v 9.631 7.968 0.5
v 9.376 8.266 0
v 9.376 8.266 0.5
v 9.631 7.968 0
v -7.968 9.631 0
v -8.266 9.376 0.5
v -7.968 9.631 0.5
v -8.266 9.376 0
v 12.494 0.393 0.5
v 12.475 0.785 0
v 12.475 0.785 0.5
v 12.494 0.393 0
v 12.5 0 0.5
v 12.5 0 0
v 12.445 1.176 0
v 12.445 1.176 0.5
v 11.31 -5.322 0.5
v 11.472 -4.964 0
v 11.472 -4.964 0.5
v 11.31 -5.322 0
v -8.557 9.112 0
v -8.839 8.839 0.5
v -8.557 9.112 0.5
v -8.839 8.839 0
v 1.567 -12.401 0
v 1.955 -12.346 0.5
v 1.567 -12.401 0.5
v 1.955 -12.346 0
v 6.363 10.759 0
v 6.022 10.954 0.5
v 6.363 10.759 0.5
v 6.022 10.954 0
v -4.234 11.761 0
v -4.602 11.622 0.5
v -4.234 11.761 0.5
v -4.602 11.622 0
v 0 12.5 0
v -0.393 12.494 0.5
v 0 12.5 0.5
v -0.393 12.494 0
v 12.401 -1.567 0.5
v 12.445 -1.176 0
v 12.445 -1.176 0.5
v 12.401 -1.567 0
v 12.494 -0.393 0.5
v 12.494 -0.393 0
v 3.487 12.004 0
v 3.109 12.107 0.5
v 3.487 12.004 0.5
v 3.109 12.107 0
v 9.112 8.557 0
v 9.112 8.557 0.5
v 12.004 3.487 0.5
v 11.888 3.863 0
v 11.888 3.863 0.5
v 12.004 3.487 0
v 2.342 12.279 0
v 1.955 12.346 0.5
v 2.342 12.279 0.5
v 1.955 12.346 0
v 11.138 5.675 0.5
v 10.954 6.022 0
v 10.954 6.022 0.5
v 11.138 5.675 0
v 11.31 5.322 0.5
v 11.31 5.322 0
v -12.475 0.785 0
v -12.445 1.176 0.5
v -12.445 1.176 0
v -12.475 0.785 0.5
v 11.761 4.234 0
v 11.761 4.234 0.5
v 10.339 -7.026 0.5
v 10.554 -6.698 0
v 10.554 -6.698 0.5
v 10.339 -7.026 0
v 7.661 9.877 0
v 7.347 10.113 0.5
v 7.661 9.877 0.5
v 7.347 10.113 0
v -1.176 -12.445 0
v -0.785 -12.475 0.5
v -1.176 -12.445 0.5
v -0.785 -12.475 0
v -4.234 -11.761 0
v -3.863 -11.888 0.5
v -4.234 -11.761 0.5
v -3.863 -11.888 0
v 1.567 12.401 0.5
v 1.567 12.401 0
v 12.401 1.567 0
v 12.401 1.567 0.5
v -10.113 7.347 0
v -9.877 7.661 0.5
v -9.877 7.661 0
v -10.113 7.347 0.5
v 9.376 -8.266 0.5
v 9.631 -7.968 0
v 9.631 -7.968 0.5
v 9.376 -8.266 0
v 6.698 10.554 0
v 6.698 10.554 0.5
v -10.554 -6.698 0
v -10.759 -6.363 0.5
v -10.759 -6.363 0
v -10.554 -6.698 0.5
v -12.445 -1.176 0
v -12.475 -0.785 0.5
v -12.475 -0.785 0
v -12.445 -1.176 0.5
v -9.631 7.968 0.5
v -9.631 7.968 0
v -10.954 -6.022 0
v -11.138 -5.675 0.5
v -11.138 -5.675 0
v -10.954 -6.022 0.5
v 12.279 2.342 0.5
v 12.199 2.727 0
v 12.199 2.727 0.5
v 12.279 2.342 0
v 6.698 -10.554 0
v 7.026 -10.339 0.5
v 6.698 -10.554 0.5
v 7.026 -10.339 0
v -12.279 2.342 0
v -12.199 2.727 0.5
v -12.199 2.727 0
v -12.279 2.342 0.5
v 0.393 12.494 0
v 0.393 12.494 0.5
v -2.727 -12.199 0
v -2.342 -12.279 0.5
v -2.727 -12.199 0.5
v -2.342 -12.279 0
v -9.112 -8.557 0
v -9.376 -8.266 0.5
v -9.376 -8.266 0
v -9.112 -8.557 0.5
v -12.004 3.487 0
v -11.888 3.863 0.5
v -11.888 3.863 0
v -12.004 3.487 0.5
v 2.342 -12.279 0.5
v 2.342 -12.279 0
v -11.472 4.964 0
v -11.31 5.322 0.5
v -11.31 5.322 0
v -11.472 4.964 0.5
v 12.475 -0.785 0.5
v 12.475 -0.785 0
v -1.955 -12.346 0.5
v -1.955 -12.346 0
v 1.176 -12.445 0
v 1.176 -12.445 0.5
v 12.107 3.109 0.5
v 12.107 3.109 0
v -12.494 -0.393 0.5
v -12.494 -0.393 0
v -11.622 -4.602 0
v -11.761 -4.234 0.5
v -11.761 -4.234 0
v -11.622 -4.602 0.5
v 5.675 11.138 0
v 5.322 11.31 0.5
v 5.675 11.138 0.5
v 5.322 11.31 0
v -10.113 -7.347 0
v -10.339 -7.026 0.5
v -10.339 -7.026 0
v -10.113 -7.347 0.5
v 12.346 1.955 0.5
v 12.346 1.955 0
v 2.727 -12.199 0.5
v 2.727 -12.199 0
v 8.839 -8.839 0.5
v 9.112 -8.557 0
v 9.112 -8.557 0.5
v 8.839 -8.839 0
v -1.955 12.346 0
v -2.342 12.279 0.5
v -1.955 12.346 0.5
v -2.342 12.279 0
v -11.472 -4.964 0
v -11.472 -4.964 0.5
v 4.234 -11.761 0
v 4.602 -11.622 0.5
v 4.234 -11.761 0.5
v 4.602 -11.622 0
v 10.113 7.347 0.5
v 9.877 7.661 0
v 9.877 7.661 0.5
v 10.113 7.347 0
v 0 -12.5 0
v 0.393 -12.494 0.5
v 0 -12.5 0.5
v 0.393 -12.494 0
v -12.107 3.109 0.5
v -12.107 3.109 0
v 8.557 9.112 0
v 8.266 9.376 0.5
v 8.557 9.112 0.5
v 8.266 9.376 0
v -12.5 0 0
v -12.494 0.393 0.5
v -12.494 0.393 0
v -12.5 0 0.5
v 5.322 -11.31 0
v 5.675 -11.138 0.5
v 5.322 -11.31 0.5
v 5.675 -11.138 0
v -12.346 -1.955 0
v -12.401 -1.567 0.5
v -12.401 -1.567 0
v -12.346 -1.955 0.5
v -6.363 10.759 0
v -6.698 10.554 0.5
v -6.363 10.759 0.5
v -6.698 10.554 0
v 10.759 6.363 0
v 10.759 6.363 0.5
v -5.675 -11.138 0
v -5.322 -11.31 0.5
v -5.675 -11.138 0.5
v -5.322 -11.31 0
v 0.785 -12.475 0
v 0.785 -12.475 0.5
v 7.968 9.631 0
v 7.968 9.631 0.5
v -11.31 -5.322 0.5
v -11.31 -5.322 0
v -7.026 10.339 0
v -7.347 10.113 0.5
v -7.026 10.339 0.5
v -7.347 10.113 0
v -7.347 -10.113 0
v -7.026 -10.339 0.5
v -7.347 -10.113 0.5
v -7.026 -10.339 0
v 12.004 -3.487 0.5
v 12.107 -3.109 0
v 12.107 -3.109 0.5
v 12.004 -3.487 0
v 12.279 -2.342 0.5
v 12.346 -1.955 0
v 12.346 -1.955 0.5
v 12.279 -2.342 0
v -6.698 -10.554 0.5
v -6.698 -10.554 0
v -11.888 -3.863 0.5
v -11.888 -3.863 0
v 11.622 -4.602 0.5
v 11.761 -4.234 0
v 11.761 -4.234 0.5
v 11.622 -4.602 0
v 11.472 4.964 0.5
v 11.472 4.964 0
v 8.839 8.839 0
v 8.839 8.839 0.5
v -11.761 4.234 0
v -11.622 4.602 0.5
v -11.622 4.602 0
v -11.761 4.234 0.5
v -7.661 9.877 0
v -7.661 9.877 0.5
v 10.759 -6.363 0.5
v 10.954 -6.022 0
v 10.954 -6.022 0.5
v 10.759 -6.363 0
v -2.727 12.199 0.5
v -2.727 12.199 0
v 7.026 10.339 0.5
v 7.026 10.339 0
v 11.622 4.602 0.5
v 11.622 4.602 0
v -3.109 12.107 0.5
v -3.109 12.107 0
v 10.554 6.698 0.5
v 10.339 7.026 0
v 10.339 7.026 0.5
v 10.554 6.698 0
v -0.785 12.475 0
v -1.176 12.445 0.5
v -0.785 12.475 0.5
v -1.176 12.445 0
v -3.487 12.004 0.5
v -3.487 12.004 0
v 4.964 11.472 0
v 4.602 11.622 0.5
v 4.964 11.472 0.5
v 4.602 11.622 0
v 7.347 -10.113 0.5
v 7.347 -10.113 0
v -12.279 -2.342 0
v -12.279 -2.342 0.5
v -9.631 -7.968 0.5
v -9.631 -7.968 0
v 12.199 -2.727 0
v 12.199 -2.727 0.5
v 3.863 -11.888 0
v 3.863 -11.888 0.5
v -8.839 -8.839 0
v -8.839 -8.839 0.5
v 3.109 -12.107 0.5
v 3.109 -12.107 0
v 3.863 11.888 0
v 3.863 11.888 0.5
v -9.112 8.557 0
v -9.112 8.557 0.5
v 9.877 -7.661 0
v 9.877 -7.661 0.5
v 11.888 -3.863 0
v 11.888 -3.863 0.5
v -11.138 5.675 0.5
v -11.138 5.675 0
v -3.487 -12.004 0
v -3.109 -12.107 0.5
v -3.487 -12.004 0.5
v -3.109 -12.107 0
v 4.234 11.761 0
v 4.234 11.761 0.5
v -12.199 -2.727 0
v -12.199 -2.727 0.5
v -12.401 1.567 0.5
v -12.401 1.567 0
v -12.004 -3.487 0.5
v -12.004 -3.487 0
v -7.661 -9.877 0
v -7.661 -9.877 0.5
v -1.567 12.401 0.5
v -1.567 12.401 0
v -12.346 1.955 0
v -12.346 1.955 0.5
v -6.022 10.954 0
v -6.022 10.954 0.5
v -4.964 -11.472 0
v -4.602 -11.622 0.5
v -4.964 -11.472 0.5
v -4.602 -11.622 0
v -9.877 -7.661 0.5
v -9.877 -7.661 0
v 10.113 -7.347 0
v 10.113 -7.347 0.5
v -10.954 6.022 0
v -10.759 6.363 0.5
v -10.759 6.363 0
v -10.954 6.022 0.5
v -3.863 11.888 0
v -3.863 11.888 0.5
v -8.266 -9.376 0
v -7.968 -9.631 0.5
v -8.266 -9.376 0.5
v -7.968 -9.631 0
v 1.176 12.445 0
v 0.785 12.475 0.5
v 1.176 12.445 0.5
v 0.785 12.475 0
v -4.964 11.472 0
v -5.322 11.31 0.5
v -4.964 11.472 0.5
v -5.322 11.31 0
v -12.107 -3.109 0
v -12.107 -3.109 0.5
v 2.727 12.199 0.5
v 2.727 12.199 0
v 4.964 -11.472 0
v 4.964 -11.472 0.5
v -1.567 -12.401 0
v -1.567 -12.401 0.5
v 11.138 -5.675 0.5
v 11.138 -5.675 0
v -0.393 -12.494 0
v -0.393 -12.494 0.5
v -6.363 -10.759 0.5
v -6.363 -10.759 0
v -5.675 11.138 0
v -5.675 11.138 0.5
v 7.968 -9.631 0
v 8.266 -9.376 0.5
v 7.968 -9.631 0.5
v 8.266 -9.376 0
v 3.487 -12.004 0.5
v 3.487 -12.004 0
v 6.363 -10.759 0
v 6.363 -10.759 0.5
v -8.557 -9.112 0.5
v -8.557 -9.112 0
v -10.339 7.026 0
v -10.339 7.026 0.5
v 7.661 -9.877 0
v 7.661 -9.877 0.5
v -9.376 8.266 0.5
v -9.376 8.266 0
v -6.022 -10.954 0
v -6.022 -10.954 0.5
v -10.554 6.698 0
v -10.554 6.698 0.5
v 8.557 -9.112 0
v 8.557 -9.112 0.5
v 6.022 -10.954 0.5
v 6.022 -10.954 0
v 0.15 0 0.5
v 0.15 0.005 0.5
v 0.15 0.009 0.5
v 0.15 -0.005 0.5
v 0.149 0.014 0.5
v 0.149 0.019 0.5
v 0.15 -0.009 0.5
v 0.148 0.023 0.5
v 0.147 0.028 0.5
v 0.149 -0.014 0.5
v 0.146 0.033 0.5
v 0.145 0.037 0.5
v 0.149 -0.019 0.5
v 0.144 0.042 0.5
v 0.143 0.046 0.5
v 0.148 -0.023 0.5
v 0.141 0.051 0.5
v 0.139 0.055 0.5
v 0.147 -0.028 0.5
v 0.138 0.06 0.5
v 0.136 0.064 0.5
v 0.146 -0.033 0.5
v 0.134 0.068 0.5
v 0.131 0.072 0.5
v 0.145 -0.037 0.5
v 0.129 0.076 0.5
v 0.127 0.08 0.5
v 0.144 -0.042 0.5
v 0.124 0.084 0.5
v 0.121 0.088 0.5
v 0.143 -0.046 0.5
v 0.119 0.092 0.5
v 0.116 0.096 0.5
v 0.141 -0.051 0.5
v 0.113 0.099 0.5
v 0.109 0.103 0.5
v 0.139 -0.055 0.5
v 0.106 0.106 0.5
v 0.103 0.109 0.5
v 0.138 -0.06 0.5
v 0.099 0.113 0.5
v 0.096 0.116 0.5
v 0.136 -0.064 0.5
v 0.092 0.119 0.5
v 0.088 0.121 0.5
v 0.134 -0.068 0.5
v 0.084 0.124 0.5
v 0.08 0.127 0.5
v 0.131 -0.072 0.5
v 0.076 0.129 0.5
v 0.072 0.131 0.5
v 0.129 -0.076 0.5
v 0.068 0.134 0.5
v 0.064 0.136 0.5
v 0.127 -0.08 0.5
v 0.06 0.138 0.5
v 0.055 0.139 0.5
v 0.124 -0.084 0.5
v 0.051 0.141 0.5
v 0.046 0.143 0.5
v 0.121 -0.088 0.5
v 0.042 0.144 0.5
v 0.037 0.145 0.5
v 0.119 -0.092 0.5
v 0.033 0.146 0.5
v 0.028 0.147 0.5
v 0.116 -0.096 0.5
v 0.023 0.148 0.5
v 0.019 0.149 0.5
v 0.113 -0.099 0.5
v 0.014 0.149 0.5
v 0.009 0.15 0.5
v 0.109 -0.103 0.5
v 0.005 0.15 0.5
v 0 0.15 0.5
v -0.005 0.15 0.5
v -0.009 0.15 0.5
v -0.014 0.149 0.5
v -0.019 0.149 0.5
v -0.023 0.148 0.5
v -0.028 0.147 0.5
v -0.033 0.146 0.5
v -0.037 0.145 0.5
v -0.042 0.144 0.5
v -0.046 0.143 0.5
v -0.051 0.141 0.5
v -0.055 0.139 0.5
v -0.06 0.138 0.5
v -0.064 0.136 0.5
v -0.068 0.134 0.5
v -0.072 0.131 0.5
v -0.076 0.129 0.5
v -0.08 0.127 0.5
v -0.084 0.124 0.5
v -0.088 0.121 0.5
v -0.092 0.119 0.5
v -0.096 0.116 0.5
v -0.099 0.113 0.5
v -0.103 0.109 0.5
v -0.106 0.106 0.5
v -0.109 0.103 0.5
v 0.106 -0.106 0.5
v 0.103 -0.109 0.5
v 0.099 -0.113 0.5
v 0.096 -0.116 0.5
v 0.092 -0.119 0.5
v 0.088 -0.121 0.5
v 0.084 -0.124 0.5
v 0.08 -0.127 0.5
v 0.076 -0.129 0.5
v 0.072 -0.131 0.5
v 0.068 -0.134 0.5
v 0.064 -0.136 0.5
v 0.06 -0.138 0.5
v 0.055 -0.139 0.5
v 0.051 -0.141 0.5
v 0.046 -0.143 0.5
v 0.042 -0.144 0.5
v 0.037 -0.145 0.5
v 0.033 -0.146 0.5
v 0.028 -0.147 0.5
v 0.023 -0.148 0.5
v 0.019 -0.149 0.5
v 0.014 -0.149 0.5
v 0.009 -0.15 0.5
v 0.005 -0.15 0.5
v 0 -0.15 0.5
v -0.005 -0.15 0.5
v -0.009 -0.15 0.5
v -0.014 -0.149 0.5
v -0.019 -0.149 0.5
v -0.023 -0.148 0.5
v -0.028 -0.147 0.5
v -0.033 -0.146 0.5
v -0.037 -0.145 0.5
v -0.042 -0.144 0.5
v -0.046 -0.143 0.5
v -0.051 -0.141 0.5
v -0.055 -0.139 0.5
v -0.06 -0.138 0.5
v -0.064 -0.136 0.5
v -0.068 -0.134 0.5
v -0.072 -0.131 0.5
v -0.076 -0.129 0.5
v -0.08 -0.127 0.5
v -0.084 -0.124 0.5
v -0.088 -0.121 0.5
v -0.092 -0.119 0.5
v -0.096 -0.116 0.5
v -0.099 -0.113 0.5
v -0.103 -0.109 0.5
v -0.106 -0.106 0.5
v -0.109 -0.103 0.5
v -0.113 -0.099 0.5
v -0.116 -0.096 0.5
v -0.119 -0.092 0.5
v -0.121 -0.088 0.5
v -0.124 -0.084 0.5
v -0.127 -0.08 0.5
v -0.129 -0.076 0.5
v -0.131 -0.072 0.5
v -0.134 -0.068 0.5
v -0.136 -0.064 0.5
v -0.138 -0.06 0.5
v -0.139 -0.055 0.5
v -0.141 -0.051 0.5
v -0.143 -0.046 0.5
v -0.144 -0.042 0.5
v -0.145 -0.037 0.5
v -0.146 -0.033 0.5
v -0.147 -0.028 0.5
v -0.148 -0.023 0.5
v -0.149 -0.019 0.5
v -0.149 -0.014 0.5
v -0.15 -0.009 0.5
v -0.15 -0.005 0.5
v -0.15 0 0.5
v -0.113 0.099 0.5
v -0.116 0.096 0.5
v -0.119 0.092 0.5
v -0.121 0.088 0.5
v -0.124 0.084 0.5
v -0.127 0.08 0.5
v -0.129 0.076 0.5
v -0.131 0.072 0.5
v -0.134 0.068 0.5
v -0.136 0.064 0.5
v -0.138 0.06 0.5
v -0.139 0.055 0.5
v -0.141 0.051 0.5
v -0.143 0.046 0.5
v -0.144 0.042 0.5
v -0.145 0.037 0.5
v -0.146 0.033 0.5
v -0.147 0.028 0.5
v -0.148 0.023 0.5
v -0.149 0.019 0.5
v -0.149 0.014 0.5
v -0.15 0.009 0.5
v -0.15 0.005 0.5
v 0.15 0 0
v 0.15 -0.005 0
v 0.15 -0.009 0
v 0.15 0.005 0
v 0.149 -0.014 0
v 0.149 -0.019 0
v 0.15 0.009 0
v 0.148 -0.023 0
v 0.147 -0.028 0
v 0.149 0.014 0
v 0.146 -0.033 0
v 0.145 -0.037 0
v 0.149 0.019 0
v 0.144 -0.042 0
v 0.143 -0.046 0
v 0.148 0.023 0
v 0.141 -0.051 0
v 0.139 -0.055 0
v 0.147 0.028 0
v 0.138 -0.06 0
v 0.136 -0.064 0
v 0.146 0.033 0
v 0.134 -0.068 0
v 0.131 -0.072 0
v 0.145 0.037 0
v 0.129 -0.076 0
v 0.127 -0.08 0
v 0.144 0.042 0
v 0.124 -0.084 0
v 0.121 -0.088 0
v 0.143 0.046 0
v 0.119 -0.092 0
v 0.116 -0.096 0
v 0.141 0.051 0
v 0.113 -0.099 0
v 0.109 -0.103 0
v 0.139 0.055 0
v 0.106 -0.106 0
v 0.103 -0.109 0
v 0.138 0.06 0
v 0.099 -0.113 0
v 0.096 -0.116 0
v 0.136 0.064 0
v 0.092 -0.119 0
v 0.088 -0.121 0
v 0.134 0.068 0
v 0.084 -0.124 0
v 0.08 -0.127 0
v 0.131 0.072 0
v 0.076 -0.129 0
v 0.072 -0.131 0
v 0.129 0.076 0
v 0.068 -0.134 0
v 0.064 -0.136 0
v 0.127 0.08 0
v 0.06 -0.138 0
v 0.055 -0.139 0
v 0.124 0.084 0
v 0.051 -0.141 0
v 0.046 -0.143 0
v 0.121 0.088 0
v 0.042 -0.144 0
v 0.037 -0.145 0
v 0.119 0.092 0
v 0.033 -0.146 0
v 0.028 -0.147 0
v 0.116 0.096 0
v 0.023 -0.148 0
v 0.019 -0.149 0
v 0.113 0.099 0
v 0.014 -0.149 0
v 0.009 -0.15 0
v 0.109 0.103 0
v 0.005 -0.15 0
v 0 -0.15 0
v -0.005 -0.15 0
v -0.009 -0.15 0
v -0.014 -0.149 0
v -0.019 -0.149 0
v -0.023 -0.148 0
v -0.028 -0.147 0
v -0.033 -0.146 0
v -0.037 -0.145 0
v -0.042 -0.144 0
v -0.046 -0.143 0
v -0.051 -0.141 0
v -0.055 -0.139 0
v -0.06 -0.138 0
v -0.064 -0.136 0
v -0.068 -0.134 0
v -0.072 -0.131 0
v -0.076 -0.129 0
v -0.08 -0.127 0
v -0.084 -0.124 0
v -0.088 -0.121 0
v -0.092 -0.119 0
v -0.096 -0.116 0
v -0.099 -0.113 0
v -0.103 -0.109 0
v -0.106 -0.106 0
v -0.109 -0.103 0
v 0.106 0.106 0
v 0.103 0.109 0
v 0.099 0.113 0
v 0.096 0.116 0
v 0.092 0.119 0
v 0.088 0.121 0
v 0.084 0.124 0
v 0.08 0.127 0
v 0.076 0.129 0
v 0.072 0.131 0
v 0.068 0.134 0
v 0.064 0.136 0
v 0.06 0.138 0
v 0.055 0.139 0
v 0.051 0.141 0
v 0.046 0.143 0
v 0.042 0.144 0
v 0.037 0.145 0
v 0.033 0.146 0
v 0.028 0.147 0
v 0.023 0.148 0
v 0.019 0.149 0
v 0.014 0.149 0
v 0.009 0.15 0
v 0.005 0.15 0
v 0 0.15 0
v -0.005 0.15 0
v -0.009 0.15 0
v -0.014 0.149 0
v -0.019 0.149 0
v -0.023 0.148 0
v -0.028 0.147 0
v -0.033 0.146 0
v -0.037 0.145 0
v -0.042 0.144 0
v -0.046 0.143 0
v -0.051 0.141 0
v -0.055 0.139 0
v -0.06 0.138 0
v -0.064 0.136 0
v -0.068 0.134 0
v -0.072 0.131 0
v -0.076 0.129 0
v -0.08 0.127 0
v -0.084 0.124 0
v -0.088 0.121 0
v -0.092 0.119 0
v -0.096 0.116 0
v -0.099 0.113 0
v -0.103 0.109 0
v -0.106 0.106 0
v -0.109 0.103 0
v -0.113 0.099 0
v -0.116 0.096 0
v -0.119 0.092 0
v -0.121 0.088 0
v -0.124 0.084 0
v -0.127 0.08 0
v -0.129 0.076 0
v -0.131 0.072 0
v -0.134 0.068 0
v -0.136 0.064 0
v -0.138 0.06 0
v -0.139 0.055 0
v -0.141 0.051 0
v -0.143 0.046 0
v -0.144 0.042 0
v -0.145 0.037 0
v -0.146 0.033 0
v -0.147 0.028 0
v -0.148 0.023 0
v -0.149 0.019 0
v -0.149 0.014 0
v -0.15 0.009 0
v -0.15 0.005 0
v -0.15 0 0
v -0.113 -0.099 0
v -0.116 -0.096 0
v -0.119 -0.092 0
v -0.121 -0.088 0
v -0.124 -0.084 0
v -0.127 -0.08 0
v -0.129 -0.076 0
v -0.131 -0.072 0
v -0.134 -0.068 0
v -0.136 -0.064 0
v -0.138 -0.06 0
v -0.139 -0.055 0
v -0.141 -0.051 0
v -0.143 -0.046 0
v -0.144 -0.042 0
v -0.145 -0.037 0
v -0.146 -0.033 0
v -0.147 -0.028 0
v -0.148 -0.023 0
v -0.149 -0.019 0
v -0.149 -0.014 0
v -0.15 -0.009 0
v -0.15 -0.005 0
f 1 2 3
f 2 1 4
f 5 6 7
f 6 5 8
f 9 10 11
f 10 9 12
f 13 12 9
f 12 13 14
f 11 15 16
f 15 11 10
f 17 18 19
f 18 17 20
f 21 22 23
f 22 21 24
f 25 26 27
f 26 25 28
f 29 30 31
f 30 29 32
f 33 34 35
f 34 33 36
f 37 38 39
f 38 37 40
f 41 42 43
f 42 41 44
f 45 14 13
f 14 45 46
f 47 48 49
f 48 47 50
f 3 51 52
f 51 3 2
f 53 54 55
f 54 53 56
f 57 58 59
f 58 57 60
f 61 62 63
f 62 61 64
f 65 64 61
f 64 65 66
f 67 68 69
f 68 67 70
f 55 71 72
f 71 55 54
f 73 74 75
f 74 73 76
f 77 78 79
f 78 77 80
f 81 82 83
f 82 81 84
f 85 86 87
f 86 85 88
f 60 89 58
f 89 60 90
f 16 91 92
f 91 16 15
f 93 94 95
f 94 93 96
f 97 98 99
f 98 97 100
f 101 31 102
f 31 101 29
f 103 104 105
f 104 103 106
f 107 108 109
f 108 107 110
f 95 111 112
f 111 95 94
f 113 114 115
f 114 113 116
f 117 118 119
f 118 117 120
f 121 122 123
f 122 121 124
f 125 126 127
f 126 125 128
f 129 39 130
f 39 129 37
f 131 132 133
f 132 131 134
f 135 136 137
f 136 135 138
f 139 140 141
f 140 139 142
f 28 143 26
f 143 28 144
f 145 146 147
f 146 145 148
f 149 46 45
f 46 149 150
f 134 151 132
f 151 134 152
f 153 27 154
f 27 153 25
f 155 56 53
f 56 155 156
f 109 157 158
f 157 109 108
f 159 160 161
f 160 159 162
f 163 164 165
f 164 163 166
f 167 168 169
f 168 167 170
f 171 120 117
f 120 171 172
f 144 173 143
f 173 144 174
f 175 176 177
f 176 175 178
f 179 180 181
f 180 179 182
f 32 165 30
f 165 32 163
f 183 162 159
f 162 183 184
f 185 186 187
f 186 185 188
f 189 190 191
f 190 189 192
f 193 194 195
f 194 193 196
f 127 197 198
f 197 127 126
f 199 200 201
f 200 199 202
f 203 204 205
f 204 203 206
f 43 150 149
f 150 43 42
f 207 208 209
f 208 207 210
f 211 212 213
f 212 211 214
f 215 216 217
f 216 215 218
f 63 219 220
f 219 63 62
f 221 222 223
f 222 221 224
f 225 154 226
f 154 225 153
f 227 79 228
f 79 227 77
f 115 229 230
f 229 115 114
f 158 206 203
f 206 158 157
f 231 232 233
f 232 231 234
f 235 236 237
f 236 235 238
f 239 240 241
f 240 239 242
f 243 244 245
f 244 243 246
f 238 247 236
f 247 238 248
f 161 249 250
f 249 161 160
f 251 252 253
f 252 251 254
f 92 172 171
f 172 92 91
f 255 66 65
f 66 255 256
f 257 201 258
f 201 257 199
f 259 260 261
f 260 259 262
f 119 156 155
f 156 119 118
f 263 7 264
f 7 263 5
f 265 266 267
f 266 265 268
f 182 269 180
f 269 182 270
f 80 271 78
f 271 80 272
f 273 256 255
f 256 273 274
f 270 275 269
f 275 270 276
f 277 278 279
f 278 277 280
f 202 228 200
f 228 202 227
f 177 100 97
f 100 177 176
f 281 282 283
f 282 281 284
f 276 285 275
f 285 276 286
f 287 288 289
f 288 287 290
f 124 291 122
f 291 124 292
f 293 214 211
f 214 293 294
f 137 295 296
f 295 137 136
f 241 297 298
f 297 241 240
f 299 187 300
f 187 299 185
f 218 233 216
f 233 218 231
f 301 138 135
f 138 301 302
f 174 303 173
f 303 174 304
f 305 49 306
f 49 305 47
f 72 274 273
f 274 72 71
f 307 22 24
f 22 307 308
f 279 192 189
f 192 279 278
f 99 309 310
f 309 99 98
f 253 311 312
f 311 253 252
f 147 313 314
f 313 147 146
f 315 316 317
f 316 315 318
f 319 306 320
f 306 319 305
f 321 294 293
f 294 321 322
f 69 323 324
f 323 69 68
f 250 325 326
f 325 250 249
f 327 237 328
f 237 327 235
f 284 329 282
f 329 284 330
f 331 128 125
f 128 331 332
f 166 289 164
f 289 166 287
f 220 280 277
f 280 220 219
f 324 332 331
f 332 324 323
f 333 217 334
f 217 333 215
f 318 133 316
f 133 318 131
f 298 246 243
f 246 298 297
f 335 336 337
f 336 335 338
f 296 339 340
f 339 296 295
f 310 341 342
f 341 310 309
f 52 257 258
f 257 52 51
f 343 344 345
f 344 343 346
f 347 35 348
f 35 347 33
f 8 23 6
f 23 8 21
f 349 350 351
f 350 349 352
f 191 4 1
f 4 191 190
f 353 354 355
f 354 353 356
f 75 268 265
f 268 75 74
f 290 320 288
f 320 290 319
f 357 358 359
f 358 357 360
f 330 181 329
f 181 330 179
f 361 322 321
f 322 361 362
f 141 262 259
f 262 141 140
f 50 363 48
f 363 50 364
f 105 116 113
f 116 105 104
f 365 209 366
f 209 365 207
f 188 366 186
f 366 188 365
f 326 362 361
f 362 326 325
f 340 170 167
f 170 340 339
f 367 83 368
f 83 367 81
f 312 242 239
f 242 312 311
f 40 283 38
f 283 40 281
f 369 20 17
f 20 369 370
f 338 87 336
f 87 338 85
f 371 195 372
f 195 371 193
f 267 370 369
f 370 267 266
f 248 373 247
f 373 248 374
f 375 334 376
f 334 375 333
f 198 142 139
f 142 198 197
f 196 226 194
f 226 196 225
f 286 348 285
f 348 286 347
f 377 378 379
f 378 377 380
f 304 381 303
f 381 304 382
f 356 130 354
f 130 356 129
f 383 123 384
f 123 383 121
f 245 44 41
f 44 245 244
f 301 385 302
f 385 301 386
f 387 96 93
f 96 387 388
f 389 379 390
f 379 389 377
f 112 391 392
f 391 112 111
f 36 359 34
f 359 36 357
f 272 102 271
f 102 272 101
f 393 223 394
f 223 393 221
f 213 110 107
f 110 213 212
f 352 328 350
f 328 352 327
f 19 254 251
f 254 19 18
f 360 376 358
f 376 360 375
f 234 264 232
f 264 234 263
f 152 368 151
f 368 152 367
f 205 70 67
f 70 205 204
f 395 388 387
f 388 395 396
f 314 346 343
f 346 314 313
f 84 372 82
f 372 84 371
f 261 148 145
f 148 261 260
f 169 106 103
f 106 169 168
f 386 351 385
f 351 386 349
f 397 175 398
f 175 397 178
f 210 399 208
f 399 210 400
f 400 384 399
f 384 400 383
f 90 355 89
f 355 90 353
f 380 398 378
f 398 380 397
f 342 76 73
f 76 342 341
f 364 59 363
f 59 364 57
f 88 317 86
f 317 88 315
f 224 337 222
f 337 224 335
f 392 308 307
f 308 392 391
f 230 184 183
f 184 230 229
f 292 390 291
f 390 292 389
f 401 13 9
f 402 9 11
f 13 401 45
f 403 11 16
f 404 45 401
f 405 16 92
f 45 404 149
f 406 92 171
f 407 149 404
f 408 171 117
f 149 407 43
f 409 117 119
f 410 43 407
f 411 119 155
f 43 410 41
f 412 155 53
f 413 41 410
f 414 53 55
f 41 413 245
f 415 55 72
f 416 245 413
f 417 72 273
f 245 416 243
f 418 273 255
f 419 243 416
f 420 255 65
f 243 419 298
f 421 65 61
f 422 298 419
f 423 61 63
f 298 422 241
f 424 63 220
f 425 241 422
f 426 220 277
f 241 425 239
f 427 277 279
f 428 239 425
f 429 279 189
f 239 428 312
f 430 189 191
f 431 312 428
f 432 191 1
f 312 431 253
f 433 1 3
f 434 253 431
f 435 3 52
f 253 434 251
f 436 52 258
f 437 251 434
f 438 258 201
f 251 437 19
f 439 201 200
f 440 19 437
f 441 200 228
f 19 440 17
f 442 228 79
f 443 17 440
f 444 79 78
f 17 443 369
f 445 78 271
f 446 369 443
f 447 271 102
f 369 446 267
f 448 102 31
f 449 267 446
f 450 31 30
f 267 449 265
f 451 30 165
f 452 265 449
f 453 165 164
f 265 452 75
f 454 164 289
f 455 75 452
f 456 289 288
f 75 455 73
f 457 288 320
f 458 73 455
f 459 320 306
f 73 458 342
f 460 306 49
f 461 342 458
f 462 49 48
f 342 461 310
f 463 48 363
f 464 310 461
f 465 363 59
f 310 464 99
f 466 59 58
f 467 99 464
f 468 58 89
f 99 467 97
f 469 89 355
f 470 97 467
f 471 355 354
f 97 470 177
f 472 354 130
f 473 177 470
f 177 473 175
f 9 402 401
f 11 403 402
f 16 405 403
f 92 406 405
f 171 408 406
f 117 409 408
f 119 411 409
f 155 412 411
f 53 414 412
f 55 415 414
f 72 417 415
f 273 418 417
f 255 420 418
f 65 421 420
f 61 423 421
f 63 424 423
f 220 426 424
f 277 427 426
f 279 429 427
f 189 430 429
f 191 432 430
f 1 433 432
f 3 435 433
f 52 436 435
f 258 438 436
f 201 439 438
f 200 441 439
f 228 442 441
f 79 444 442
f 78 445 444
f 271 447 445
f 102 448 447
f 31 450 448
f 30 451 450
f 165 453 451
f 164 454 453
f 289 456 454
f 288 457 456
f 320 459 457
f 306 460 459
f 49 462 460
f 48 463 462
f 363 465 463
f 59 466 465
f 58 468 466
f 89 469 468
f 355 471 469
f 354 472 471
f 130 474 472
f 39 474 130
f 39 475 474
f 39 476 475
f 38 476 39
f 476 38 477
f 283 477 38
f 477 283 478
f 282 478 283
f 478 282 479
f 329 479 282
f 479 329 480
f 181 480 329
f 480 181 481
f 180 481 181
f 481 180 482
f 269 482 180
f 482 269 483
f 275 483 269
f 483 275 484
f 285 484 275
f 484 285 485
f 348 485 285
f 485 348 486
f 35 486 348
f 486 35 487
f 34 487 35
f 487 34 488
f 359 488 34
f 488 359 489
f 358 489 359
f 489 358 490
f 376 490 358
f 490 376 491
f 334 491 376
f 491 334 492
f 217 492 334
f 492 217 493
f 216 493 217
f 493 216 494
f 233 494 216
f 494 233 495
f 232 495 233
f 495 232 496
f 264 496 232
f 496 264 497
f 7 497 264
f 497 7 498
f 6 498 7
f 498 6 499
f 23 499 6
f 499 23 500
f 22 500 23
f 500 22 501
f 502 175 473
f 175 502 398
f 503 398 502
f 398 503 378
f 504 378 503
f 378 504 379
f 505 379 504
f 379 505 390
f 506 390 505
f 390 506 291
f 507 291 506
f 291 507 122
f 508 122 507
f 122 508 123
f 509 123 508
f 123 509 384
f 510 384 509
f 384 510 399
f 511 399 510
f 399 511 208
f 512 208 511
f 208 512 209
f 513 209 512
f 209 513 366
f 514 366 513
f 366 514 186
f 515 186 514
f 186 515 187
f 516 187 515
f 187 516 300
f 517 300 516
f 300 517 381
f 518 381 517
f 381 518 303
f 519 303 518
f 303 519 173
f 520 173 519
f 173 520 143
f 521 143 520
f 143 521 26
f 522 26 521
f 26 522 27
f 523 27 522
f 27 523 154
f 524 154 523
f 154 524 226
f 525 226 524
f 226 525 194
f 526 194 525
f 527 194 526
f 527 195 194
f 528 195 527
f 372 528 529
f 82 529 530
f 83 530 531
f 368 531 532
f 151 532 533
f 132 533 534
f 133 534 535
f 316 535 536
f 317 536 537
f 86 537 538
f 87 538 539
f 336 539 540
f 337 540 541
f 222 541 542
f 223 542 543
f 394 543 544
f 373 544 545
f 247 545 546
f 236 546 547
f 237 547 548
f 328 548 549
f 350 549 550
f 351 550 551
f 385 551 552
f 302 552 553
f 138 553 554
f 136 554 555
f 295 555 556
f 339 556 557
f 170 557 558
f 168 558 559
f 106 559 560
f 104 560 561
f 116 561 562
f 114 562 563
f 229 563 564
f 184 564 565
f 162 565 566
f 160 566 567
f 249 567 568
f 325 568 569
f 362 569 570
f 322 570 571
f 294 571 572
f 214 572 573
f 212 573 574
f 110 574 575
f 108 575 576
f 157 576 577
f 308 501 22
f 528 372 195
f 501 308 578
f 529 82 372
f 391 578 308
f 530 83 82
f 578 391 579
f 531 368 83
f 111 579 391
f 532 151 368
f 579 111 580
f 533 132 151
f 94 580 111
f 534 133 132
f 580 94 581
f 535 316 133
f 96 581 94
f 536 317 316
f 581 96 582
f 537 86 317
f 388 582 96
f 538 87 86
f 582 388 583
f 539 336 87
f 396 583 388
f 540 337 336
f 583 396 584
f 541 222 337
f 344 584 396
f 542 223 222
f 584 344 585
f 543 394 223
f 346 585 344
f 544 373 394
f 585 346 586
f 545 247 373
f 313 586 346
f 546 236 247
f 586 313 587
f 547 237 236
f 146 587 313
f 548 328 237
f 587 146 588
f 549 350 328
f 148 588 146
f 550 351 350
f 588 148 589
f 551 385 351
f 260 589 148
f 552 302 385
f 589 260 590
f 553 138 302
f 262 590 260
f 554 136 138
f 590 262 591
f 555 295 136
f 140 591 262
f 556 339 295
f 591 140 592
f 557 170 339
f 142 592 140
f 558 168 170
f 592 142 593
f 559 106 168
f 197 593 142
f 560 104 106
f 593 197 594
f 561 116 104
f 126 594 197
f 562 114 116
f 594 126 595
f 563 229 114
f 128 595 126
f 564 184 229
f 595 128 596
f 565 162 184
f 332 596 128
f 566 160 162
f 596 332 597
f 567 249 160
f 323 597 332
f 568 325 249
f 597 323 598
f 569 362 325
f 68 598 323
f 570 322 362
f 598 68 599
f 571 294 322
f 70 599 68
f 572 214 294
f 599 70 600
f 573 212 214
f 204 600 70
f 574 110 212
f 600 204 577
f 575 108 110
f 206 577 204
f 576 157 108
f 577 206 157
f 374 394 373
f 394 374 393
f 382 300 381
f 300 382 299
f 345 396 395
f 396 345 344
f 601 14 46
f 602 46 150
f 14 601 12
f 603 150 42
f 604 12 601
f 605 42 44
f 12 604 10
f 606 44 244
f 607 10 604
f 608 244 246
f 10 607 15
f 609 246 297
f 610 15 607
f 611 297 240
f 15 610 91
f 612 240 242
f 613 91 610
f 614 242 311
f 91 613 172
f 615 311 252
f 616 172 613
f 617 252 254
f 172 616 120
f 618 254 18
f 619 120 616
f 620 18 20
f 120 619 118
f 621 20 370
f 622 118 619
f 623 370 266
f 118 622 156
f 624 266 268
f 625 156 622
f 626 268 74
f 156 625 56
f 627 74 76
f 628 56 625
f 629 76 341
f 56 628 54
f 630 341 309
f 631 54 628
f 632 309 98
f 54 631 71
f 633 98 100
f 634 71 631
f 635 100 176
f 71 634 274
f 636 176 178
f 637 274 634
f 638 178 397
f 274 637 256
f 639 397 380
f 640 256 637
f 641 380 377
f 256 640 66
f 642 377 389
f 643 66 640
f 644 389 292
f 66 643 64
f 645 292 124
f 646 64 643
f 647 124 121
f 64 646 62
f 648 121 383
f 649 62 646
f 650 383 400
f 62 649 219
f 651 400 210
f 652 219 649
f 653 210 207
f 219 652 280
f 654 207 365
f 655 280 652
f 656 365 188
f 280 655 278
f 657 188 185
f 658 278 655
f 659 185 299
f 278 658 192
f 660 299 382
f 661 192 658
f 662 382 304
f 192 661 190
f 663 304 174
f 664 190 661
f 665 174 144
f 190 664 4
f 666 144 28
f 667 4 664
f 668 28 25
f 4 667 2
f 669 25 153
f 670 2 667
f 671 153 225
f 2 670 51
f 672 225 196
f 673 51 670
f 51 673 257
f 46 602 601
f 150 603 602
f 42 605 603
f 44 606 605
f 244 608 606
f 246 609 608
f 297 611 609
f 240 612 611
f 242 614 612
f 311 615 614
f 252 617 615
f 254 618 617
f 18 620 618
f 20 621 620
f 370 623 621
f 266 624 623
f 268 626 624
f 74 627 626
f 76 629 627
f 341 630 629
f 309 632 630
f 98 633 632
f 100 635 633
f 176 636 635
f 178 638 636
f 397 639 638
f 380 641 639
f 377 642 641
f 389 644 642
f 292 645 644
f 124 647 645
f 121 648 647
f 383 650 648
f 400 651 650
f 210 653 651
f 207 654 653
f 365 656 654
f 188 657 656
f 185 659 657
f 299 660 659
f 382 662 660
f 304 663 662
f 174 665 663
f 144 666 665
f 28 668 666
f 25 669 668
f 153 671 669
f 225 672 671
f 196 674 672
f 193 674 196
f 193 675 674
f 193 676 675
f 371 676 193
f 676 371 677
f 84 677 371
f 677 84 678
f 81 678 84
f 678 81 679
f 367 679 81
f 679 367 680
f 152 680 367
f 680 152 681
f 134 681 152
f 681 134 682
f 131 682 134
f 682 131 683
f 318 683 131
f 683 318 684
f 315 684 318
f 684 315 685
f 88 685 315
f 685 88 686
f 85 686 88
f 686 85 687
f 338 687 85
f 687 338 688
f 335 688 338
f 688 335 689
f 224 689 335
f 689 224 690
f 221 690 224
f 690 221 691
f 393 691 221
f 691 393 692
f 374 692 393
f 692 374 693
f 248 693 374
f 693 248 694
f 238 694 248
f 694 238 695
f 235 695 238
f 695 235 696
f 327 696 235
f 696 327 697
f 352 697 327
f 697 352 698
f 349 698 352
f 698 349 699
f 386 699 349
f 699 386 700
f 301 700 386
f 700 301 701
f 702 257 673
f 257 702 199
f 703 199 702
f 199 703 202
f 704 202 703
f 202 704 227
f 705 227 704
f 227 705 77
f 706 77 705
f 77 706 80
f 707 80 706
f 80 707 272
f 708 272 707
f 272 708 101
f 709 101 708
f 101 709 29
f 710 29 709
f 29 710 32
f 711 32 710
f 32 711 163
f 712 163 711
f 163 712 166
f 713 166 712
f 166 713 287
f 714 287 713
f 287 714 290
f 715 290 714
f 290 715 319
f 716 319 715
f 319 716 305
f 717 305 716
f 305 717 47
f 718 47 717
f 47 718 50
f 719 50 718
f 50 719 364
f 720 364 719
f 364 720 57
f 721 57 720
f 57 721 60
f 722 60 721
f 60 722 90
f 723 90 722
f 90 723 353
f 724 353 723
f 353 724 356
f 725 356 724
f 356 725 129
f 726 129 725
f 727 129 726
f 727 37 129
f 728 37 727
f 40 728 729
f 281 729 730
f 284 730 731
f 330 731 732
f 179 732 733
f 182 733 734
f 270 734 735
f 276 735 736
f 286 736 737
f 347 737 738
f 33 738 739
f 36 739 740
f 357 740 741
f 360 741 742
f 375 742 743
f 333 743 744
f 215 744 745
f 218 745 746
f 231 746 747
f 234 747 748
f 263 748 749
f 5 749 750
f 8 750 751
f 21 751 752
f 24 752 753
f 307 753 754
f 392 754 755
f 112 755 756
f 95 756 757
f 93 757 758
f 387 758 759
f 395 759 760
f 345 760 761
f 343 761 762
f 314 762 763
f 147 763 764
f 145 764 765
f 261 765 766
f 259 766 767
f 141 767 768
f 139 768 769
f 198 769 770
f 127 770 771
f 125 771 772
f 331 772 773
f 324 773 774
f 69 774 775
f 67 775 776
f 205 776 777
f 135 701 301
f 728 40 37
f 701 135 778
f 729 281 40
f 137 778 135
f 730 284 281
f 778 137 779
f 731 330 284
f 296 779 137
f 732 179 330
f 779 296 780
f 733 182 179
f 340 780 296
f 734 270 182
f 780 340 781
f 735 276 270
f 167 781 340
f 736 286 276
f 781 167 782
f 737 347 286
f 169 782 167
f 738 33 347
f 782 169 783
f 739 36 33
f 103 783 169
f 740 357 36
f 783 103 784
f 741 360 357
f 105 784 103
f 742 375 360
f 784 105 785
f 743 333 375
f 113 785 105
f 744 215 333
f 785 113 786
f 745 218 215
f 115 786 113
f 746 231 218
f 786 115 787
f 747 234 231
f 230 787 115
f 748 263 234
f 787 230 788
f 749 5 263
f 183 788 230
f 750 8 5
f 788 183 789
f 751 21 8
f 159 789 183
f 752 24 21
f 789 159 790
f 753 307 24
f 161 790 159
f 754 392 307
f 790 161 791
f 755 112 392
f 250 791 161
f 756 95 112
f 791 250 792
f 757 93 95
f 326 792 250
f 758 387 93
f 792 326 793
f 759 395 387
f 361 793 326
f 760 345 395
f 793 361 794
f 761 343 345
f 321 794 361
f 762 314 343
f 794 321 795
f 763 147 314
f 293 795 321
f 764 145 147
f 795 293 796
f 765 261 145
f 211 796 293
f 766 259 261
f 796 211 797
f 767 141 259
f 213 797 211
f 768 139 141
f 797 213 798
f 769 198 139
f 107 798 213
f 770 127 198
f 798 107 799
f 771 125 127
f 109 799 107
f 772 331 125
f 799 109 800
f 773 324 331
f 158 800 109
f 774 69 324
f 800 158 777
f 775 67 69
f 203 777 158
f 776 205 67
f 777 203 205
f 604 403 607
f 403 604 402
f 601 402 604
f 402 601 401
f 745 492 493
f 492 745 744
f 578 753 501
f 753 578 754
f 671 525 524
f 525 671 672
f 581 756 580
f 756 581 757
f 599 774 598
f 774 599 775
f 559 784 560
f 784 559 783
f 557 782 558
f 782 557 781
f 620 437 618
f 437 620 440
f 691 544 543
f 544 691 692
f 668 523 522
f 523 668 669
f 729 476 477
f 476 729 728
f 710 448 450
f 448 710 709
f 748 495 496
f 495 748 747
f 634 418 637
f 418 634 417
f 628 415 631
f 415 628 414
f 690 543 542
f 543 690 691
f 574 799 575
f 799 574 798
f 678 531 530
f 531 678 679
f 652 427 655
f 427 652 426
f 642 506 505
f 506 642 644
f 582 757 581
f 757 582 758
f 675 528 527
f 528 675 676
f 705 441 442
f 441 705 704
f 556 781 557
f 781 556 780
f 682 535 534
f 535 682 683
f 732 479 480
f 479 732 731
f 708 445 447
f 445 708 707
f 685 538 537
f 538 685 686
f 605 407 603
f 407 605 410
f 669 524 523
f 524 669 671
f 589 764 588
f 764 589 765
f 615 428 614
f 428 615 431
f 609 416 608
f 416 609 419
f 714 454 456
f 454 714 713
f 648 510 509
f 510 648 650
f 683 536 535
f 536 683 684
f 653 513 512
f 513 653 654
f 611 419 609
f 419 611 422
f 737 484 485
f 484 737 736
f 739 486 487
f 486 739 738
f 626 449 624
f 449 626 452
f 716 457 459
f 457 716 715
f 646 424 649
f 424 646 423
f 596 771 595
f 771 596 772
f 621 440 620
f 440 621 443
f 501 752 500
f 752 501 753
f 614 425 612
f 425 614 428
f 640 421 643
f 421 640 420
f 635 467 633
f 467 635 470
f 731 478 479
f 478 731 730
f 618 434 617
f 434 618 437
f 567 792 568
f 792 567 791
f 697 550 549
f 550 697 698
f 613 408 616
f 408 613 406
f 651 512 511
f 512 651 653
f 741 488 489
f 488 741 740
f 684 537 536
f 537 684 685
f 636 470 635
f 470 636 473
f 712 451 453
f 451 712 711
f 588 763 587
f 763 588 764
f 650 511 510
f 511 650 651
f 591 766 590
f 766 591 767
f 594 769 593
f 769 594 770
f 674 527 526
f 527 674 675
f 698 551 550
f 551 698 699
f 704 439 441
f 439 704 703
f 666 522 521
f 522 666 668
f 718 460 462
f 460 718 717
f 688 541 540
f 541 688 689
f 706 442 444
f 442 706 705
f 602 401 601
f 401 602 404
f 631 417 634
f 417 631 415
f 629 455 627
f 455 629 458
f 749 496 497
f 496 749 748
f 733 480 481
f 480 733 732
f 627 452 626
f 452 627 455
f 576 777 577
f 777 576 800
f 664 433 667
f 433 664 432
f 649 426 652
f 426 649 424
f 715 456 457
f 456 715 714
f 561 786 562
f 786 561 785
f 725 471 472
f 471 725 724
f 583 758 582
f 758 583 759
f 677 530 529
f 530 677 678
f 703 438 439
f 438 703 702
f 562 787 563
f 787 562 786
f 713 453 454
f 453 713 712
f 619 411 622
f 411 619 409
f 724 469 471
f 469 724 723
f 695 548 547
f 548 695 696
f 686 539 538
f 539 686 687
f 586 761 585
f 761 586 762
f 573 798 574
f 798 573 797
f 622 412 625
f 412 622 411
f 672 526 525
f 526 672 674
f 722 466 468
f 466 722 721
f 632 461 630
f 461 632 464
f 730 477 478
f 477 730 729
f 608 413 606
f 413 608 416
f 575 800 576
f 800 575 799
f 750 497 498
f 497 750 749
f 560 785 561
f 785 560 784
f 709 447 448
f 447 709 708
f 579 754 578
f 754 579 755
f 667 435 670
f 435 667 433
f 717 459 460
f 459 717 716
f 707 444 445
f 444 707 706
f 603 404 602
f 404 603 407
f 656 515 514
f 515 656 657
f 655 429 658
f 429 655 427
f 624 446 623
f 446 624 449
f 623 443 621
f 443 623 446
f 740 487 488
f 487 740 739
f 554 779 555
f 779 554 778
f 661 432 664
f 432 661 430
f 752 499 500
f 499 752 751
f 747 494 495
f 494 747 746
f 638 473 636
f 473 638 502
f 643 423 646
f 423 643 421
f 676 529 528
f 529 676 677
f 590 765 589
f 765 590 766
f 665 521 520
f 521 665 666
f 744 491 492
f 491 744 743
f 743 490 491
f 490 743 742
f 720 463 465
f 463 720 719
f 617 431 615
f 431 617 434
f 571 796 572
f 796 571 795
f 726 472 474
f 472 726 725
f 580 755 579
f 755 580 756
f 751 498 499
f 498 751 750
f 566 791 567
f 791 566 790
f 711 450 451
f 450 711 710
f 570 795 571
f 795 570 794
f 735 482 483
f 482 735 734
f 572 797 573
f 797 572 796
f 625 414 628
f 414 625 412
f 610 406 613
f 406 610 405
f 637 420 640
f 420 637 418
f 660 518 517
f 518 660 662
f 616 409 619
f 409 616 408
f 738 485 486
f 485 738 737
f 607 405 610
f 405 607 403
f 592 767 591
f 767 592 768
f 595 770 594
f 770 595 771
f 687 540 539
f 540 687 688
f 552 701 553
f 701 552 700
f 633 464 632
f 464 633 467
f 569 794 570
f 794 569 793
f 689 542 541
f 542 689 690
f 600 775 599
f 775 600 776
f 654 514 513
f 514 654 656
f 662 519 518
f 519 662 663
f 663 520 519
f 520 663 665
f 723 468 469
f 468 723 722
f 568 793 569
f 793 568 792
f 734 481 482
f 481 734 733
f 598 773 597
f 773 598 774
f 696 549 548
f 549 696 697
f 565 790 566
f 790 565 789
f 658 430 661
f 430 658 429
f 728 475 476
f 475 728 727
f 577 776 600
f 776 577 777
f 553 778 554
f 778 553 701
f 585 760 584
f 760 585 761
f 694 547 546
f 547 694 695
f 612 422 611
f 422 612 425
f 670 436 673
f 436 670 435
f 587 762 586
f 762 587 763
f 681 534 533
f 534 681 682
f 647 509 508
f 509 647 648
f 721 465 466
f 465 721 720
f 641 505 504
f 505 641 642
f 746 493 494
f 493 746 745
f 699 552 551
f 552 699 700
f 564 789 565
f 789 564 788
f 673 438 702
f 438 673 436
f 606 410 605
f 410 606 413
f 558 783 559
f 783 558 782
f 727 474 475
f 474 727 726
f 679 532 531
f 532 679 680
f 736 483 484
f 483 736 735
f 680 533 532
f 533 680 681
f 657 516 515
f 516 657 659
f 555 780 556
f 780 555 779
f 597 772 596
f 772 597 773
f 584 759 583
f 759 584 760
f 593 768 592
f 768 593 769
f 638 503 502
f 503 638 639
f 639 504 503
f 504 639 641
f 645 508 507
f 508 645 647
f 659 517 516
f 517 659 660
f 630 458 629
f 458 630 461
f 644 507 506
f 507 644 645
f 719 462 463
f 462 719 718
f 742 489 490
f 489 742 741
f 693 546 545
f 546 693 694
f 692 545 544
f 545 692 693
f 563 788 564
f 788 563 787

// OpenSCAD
//==============================
// Parametric Single Pinhole Disc
// For SLA Printing
// Units: mm
//==============================

// PARAMETERS
disc_diameter = 25;      // Overall disc diameter
disc_thickness = 0.50;   // Disc thickness
hole_diameter = 0.30;    // Central pinhole

$fn = 200;               // Smooth circles

difference() {

    // Disc
    cylinder(
        d = disc_diameter,
        h = disc_thickness,
        center = false
    );

    // Pinhole
    translate([0,0,-1])
        cylinder(
            d = hole_diameter,
            h = disc_thickness + 2
        );

}
